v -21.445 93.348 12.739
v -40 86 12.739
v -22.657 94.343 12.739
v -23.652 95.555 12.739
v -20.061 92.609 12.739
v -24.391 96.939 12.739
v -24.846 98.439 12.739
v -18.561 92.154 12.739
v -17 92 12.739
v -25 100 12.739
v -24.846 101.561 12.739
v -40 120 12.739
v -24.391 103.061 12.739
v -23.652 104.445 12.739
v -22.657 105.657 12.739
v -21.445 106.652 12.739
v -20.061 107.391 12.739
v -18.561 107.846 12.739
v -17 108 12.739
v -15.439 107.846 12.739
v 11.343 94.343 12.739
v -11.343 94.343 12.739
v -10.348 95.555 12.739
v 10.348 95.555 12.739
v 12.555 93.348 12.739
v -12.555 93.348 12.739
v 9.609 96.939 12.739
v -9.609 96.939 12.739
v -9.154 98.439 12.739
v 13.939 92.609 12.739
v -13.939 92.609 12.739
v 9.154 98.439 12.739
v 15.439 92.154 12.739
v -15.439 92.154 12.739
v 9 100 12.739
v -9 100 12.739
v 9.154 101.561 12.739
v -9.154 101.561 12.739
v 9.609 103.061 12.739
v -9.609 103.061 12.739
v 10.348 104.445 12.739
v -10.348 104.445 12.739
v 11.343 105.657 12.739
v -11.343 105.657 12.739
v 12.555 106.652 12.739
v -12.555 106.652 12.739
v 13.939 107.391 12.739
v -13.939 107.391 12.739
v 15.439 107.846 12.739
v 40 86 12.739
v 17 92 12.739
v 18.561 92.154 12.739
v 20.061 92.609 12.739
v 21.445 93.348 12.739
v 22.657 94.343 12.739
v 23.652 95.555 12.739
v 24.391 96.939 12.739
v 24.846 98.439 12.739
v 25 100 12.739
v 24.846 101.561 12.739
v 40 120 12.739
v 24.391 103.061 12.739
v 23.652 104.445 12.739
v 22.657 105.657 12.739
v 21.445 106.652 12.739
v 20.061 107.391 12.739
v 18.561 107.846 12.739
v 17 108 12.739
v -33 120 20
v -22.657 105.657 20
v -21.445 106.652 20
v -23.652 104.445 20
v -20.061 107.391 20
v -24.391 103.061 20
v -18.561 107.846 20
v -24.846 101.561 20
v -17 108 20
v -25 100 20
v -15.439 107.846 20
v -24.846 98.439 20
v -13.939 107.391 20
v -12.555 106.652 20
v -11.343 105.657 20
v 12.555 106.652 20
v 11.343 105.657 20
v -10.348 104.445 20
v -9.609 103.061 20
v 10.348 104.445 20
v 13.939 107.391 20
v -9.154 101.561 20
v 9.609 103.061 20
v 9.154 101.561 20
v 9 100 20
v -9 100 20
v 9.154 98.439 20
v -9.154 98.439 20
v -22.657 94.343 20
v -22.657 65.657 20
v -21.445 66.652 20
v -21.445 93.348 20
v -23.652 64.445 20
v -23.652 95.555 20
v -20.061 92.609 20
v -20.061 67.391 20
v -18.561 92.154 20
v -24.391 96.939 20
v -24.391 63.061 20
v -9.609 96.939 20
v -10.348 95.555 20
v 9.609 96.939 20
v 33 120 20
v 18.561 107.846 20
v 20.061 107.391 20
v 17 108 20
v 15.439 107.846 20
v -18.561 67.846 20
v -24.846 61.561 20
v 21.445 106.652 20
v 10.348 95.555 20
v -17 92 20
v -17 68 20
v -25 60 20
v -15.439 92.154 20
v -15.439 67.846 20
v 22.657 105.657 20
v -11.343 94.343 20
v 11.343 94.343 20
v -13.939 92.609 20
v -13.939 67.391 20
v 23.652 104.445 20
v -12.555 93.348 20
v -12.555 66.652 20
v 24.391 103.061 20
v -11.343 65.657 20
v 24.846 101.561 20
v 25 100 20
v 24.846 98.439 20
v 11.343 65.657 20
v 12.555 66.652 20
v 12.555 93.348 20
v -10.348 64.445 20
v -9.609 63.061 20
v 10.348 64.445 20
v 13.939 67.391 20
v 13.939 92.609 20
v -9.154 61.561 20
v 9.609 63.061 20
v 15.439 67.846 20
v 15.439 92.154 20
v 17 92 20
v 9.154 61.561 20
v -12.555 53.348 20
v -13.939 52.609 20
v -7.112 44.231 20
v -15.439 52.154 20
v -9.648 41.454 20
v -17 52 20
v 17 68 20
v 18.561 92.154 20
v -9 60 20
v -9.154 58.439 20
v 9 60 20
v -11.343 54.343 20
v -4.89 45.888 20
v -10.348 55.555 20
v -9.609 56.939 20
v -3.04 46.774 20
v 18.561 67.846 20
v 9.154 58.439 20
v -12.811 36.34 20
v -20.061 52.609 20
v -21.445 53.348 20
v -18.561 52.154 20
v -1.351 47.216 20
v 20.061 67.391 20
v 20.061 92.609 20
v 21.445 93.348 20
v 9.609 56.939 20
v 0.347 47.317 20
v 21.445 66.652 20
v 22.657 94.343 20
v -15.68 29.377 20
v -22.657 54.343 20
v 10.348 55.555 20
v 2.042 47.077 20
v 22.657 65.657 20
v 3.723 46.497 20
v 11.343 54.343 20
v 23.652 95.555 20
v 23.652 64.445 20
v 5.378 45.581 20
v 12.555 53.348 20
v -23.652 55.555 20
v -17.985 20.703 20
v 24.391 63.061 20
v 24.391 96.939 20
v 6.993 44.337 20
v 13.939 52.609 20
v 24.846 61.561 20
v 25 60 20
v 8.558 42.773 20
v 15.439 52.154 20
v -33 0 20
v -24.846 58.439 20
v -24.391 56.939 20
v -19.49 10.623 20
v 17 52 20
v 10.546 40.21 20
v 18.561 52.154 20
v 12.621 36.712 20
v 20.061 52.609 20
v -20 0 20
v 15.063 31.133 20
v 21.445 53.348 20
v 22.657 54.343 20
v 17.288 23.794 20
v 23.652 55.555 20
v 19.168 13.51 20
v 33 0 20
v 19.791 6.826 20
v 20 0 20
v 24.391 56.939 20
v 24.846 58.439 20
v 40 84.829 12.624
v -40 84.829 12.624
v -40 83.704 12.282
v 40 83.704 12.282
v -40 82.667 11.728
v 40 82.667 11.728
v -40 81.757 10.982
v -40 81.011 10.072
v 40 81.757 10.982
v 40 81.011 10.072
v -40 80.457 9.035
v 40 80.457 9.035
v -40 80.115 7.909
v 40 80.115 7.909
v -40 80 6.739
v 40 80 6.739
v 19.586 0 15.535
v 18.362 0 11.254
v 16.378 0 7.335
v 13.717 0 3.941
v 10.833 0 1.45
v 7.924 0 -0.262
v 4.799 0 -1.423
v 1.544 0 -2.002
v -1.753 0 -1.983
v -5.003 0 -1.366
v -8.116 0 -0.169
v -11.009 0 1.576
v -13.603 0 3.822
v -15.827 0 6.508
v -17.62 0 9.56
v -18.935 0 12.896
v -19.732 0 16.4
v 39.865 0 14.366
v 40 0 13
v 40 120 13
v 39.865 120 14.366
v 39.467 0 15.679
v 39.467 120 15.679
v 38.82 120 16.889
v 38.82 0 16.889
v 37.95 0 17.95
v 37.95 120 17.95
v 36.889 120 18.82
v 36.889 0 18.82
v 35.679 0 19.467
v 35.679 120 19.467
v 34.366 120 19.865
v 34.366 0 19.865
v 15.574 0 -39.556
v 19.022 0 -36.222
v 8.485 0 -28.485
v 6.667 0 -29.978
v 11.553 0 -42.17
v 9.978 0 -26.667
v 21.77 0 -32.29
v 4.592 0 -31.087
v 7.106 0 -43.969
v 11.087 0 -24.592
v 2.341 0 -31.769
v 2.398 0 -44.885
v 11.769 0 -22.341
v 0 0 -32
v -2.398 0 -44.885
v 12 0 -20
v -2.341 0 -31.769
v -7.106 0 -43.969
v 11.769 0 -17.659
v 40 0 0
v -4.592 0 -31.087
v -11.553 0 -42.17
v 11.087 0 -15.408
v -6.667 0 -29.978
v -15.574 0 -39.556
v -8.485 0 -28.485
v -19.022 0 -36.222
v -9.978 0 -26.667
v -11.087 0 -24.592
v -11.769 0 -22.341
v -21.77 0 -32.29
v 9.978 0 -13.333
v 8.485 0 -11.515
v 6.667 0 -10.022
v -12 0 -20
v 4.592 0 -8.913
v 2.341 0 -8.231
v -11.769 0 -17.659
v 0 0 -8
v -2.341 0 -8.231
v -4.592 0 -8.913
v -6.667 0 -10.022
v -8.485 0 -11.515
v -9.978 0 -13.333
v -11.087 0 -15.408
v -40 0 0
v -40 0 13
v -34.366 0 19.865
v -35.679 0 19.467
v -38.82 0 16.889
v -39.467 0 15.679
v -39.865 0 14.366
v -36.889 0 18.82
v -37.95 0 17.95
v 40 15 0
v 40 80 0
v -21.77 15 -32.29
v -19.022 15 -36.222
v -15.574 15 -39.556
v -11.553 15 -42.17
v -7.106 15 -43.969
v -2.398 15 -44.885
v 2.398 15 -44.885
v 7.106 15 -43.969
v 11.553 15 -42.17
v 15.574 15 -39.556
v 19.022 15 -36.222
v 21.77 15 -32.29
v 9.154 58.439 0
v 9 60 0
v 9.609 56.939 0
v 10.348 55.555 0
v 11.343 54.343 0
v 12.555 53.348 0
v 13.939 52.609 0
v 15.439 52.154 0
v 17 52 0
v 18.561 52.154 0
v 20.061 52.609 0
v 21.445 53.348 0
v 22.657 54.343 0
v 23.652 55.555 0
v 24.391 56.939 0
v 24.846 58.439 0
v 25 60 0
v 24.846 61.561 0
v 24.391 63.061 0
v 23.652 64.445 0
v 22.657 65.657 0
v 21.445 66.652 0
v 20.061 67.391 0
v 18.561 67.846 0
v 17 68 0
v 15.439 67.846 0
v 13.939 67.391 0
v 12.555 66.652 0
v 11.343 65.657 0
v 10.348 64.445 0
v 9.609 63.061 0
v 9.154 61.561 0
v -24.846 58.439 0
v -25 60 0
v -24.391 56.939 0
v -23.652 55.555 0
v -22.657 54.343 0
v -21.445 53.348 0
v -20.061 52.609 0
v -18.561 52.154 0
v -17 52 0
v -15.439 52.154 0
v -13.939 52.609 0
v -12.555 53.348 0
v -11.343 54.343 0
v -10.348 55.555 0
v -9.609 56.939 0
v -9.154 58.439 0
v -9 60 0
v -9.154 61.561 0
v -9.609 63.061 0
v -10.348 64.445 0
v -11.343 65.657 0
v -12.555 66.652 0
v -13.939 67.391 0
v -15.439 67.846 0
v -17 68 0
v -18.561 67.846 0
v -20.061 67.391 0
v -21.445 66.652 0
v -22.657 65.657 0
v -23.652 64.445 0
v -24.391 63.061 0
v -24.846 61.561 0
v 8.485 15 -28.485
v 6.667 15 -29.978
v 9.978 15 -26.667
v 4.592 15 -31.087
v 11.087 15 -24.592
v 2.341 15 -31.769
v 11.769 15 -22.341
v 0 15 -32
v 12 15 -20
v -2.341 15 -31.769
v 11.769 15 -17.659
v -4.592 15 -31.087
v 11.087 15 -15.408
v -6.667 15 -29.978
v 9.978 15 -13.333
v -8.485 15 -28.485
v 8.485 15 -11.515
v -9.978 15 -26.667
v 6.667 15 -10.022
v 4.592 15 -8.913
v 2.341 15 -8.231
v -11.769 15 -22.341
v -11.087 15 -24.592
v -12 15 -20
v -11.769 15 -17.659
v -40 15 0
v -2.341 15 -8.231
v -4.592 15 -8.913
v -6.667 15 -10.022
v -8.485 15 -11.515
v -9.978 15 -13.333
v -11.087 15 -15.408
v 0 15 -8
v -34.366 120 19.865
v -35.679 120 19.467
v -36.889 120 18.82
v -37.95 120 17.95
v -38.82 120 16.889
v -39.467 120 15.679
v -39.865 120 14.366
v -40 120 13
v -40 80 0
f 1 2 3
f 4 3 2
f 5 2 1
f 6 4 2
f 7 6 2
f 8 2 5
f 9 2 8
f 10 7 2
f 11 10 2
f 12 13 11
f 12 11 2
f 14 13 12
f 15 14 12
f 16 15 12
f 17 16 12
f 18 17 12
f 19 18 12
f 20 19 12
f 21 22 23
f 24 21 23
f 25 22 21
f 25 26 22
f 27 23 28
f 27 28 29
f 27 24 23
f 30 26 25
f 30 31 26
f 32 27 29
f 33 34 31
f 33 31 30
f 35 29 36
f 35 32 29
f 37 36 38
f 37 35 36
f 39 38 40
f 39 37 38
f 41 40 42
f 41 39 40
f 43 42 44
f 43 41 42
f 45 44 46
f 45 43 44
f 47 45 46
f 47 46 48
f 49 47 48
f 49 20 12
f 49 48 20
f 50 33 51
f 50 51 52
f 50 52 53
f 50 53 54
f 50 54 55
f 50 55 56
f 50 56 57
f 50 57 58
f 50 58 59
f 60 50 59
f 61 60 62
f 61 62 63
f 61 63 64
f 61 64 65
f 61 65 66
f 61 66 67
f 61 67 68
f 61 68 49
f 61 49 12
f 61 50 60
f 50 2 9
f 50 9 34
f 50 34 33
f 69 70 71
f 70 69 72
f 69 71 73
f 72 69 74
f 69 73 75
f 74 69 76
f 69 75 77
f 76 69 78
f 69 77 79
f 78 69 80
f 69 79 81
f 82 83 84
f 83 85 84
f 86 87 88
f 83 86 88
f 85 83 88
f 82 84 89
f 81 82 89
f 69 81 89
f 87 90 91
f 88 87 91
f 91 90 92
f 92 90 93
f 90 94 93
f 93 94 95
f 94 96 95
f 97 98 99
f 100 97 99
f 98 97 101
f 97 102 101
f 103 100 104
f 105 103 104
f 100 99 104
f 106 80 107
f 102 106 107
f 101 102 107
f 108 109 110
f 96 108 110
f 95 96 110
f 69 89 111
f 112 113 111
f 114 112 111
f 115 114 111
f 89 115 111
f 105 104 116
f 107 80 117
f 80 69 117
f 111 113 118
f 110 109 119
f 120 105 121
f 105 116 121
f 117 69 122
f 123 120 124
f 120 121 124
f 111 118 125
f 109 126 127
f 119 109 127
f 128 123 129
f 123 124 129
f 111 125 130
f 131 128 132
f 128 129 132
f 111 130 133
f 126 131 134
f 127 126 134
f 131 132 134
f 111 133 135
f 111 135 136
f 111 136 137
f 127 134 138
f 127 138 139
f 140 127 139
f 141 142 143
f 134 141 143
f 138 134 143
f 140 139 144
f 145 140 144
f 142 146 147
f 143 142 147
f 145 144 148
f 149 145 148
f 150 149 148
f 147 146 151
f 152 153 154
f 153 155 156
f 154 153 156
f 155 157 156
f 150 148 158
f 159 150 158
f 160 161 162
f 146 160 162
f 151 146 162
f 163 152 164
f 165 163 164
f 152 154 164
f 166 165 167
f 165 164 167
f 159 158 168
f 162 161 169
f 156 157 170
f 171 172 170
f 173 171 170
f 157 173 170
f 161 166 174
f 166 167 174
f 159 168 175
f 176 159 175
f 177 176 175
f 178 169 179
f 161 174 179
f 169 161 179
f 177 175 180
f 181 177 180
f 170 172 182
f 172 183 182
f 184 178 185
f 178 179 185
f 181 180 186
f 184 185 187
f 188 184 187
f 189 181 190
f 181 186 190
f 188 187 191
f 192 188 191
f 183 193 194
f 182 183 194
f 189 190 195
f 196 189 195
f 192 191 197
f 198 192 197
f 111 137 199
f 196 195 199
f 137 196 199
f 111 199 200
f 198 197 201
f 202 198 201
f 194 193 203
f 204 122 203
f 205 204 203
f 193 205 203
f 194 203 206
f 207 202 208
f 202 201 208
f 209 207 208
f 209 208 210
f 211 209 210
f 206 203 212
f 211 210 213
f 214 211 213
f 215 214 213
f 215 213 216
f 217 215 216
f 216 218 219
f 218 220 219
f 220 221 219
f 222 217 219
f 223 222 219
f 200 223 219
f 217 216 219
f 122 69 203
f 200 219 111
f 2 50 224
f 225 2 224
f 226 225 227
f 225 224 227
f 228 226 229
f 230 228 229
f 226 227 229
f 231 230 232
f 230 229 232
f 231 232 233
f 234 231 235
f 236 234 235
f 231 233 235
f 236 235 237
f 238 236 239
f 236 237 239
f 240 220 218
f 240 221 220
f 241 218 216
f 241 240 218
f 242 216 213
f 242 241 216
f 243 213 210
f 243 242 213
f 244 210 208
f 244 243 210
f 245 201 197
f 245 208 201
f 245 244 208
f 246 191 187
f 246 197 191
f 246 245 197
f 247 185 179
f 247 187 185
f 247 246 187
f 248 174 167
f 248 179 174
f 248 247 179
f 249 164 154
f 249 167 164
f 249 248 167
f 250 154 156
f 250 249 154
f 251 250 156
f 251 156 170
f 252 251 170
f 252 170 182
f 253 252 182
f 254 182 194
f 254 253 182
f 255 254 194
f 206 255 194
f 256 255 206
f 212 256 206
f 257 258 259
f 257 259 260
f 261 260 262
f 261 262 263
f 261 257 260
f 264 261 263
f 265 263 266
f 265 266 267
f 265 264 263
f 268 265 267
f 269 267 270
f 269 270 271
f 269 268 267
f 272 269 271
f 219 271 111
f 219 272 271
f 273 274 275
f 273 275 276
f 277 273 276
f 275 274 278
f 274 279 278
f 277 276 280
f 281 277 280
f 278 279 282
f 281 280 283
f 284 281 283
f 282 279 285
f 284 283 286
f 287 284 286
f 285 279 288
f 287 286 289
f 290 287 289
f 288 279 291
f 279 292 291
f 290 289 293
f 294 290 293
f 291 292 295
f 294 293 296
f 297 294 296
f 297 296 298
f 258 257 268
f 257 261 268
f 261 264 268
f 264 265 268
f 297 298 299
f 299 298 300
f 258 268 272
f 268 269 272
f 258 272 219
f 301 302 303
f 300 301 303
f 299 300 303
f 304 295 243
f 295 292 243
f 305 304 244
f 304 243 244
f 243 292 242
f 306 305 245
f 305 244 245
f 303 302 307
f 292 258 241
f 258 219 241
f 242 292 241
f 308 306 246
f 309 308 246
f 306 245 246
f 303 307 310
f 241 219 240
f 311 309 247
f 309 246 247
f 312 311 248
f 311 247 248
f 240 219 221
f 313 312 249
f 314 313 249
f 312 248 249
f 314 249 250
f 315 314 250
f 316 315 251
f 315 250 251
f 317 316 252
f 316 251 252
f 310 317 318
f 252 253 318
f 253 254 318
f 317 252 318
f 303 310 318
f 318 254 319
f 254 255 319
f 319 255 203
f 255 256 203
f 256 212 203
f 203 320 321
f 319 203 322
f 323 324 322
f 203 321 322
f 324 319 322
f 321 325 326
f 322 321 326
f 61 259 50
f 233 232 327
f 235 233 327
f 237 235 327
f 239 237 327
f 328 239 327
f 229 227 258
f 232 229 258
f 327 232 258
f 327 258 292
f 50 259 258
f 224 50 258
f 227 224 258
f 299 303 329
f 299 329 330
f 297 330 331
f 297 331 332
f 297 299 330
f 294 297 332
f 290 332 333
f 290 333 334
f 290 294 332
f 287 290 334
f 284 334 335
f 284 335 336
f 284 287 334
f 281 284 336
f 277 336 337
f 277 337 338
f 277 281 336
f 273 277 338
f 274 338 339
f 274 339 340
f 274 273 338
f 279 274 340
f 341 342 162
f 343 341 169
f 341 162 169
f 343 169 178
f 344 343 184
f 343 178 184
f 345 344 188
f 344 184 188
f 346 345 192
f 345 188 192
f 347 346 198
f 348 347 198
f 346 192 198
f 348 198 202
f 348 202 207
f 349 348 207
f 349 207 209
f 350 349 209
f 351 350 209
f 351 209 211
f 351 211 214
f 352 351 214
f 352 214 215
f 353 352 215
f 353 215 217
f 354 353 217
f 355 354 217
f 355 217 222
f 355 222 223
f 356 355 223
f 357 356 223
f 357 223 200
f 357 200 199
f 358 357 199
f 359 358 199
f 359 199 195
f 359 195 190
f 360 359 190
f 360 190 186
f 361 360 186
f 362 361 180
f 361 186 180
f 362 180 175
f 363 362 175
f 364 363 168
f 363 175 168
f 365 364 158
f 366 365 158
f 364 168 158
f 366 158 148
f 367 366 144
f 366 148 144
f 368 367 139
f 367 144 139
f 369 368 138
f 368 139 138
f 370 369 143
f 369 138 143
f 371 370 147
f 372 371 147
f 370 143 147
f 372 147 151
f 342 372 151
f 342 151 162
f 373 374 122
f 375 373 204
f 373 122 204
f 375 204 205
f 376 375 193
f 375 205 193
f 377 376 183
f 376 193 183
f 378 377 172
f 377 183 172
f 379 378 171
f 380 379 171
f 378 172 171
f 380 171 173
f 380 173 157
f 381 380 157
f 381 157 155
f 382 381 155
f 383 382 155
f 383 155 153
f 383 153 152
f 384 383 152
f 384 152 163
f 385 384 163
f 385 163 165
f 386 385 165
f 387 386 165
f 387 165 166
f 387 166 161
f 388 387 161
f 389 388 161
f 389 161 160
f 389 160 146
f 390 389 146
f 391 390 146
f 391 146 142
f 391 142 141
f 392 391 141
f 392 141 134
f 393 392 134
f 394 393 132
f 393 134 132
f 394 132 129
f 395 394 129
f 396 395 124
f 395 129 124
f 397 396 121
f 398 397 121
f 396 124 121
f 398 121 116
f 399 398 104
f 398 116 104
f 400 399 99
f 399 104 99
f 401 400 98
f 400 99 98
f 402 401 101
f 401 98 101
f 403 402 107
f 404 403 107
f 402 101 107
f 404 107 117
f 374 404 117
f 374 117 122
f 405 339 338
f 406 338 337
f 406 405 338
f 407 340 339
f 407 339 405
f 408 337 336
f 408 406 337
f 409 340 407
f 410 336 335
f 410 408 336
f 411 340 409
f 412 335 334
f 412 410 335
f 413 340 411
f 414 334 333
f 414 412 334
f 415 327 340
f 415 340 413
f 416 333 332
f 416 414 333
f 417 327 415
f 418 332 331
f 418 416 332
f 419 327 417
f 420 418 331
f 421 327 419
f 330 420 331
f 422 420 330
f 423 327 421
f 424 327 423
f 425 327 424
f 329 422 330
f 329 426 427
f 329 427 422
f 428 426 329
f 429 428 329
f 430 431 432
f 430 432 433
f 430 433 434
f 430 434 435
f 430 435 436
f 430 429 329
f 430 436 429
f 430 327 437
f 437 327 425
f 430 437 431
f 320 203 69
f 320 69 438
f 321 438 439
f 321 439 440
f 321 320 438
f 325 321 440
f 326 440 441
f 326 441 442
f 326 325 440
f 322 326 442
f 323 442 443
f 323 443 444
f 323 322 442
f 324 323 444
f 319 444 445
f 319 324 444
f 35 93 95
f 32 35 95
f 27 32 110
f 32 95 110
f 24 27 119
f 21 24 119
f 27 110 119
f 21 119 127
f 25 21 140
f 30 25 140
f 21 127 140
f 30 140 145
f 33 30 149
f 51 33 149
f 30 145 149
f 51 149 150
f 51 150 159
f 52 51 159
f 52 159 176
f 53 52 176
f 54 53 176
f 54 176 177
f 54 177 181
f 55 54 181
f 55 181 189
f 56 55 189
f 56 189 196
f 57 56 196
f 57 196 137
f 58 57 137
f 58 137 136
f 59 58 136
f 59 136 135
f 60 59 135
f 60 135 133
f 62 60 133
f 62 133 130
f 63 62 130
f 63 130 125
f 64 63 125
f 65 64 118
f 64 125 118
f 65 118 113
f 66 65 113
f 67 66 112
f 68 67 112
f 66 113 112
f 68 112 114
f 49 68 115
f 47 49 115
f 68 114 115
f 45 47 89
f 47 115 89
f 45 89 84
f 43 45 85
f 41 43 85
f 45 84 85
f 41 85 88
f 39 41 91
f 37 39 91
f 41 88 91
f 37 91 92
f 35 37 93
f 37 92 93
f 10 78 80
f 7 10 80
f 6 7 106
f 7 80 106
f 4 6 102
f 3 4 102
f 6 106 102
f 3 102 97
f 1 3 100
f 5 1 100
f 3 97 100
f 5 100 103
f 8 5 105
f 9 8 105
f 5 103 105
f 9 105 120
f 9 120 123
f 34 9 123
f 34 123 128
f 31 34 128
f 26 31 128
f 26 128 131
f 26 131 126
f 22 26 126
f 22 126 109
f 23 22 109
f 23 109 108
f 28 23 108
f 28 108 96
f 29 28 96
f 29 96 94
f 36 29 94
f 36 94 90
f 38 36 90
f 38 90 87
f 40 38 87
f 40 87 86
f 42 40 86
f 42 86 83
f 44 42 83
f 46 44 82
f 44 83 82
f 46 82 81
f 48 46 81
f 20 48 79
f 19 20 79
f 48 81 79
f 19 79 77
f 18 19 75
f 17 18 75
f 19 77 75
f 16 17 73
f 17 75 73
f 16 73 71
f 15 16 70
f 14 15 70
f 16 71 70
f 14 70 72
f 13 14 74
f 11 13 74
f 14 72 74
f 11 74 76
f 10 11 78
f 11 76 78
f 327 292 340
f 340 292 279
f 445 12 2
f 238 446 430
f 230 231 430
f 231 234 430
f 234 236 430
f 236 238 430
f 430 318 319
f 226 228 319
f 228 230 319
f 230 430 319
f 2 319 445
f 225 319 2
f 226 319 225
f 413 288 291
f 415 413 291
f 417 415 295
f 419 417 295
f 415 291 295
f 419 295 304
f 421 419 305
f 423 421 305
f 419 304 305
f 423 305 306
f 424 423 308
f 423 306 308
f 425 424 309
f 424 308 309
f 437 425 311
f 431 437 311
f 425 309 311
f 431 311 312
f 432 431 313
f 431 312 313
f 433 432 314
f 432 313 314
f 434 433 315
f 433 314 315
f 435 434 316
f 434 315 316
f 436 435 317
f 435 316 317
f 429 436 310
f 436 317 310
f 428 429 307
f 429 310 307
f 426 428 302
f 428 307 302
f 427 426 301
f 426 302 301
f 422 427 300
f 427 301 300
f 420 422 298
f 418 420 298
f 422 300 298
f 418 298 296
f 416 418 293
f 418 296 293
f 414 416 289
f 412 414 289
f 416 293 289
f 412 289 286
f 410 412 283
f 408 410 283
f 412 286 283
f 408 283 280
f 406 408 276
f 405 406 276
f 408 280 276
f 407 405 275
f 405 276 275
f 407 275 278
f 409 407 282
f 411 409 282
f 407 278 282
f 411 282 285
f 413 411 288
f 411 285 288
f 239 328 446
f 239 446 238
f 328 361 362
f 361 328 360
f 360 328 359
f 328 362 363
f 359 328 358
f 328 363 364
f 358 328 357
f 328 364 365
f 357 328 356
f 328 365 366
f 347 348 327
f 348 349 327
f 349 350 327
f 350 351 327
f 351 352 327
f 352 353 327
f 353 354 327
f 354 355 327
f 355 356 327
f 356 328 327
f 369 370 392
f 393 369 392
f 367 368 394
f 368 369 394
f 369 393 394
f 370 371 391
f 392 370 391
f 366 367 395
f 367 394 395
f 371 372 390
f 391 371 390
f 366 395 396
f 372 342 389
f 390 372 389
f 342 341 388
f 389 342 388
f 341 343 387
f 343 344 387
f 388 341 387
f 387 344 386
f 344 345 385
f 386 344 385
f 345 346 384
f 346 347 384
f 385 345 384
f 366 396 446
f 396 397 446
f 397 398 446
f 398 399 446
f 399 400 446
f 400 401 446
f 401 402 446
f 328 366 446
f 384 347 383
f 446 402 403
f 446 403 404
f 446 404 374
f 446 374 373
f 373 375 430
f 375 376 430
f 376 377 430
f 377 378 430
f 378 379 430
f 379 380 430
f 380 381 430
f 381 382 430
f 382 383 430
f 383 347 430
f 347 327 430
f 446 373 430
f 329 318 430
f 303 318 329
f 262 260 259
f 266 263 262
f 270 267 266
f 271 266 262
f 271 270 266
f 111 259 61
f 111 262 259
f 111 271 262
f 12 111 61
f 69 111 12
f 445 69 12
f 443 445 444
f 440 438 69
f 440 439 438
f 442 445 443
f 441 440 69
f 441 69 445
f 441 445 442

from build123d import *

# Parameters (mm, degrees)
CYLINDER_R               = 20
CYLINDER_DEPTH           = 100
CYLINDER_PLACEMENT_ANGLE = 295
PAD_DEPTH                = 120
POCKET_DEPTH             = 80.001
SKETCH003_R              = 12
PAD001_DEPTH             = 15
SKETCH004_R              = 8
POCKET001_DEPTH          = 65.001


with BuildPart() as cilindro:
    # Cylinder → Cylinder (new body)
    with BuildSketch(Plane.XY):
        Circle(CYLINDER_R)
    extrude(amount=CYLINDER_DEPTH)


with BuildPart() as cilindro_1:
    # Cylinder placement: moved
    add(cilindro.part.moved(Location((0, -45.315389, -1.130913))).rotate(Axis((0, -45.315389, -1.130913), (1, 0, 0)), CYLINDER_PLACEMENT_ANGLE))


with BuildPart() as cut:
    # Sketch → Pad (new body)
    with BuildSketch(Plane.XZ):
        with BuildLine():
            Line((-33, 20), (33, 20))
            ThreePointArc((40, 13), (37.949747, 17.949747), (33, 20))
            Line((40, 13), (40, 0))
            Line((40, 0), (-40, 0))
            Line((-40, 0), (-40, 13))
            ThreePointArc((-33, 20), (-37.949747, 17.949747), (-40, 13))
        make_face()
    extrude(amount=-PAD_DEPTH)

    # Sketch002 → Pocket (cut, through all)
    with BuildSketch(Plane(origin=(40, 0, 0), x_dir=(0, 0, 1), z_dir=(1, 0, 0))):
        with BuildLine():
            Line((0, -80), (6.738911, -80))
            ThreePointArc((12.738911, -86), (10.981552, -81.757359), (6.738911, -80))
            Line((12.738911, -86), (12.738911, -134.292511))
            Line((12.738911, -134.292511), (0, -134.292511))
            Line((0, -134.292511), (0, -80))
        make_face()
    extrude(amount=-POCKET_DEPTH, mode=Mode.SUBTRACT)

    # Sketch003 → Pad001 (new body)
    with BuildSketch(Plane.XZ):
        with BuildLine():
            Line((-40, 0), (40, 0))
            Line((40, 0), (21.770267, -32.290463))
            ThreePointArc((-21.770267, -32.290463), (0, -45), (21.770267, -32.290463))
            Line((-40, 0), (-21.770267, -32.290463))
        make_face()
        with Locations((0, -20)):
            Circle(SKETCH003_R, mode=Mode.SUBTRACT)
    extrude(amount=-PAD001_DEPTH)

    # Sketch004 → Pocket001 (cut, through all)
    with BuildSketch(Plane(origin=(0, 0, 20), x_dir=(-1, 0, 0), z_dir=(0, 0, 1))):
        with Locations((17, -100)):
            Circle(SKETCH004_R)
        with Locations((-17, -100)):
            Circle(SKETCH004_R)
        with Locations((-17, -60)):
            Circle(SKETCH004_R)
        with Locations((17, -60)):
            Circle(SKETCH004_R)
    extrude(amount=-POCKET001_DEPTH, mode=Mode.SUBTRACT)

    # Cut: cut Cilindro
    add(cilindro_1.part, mode=Mode.SUBTRACT)


solid = cut.part
